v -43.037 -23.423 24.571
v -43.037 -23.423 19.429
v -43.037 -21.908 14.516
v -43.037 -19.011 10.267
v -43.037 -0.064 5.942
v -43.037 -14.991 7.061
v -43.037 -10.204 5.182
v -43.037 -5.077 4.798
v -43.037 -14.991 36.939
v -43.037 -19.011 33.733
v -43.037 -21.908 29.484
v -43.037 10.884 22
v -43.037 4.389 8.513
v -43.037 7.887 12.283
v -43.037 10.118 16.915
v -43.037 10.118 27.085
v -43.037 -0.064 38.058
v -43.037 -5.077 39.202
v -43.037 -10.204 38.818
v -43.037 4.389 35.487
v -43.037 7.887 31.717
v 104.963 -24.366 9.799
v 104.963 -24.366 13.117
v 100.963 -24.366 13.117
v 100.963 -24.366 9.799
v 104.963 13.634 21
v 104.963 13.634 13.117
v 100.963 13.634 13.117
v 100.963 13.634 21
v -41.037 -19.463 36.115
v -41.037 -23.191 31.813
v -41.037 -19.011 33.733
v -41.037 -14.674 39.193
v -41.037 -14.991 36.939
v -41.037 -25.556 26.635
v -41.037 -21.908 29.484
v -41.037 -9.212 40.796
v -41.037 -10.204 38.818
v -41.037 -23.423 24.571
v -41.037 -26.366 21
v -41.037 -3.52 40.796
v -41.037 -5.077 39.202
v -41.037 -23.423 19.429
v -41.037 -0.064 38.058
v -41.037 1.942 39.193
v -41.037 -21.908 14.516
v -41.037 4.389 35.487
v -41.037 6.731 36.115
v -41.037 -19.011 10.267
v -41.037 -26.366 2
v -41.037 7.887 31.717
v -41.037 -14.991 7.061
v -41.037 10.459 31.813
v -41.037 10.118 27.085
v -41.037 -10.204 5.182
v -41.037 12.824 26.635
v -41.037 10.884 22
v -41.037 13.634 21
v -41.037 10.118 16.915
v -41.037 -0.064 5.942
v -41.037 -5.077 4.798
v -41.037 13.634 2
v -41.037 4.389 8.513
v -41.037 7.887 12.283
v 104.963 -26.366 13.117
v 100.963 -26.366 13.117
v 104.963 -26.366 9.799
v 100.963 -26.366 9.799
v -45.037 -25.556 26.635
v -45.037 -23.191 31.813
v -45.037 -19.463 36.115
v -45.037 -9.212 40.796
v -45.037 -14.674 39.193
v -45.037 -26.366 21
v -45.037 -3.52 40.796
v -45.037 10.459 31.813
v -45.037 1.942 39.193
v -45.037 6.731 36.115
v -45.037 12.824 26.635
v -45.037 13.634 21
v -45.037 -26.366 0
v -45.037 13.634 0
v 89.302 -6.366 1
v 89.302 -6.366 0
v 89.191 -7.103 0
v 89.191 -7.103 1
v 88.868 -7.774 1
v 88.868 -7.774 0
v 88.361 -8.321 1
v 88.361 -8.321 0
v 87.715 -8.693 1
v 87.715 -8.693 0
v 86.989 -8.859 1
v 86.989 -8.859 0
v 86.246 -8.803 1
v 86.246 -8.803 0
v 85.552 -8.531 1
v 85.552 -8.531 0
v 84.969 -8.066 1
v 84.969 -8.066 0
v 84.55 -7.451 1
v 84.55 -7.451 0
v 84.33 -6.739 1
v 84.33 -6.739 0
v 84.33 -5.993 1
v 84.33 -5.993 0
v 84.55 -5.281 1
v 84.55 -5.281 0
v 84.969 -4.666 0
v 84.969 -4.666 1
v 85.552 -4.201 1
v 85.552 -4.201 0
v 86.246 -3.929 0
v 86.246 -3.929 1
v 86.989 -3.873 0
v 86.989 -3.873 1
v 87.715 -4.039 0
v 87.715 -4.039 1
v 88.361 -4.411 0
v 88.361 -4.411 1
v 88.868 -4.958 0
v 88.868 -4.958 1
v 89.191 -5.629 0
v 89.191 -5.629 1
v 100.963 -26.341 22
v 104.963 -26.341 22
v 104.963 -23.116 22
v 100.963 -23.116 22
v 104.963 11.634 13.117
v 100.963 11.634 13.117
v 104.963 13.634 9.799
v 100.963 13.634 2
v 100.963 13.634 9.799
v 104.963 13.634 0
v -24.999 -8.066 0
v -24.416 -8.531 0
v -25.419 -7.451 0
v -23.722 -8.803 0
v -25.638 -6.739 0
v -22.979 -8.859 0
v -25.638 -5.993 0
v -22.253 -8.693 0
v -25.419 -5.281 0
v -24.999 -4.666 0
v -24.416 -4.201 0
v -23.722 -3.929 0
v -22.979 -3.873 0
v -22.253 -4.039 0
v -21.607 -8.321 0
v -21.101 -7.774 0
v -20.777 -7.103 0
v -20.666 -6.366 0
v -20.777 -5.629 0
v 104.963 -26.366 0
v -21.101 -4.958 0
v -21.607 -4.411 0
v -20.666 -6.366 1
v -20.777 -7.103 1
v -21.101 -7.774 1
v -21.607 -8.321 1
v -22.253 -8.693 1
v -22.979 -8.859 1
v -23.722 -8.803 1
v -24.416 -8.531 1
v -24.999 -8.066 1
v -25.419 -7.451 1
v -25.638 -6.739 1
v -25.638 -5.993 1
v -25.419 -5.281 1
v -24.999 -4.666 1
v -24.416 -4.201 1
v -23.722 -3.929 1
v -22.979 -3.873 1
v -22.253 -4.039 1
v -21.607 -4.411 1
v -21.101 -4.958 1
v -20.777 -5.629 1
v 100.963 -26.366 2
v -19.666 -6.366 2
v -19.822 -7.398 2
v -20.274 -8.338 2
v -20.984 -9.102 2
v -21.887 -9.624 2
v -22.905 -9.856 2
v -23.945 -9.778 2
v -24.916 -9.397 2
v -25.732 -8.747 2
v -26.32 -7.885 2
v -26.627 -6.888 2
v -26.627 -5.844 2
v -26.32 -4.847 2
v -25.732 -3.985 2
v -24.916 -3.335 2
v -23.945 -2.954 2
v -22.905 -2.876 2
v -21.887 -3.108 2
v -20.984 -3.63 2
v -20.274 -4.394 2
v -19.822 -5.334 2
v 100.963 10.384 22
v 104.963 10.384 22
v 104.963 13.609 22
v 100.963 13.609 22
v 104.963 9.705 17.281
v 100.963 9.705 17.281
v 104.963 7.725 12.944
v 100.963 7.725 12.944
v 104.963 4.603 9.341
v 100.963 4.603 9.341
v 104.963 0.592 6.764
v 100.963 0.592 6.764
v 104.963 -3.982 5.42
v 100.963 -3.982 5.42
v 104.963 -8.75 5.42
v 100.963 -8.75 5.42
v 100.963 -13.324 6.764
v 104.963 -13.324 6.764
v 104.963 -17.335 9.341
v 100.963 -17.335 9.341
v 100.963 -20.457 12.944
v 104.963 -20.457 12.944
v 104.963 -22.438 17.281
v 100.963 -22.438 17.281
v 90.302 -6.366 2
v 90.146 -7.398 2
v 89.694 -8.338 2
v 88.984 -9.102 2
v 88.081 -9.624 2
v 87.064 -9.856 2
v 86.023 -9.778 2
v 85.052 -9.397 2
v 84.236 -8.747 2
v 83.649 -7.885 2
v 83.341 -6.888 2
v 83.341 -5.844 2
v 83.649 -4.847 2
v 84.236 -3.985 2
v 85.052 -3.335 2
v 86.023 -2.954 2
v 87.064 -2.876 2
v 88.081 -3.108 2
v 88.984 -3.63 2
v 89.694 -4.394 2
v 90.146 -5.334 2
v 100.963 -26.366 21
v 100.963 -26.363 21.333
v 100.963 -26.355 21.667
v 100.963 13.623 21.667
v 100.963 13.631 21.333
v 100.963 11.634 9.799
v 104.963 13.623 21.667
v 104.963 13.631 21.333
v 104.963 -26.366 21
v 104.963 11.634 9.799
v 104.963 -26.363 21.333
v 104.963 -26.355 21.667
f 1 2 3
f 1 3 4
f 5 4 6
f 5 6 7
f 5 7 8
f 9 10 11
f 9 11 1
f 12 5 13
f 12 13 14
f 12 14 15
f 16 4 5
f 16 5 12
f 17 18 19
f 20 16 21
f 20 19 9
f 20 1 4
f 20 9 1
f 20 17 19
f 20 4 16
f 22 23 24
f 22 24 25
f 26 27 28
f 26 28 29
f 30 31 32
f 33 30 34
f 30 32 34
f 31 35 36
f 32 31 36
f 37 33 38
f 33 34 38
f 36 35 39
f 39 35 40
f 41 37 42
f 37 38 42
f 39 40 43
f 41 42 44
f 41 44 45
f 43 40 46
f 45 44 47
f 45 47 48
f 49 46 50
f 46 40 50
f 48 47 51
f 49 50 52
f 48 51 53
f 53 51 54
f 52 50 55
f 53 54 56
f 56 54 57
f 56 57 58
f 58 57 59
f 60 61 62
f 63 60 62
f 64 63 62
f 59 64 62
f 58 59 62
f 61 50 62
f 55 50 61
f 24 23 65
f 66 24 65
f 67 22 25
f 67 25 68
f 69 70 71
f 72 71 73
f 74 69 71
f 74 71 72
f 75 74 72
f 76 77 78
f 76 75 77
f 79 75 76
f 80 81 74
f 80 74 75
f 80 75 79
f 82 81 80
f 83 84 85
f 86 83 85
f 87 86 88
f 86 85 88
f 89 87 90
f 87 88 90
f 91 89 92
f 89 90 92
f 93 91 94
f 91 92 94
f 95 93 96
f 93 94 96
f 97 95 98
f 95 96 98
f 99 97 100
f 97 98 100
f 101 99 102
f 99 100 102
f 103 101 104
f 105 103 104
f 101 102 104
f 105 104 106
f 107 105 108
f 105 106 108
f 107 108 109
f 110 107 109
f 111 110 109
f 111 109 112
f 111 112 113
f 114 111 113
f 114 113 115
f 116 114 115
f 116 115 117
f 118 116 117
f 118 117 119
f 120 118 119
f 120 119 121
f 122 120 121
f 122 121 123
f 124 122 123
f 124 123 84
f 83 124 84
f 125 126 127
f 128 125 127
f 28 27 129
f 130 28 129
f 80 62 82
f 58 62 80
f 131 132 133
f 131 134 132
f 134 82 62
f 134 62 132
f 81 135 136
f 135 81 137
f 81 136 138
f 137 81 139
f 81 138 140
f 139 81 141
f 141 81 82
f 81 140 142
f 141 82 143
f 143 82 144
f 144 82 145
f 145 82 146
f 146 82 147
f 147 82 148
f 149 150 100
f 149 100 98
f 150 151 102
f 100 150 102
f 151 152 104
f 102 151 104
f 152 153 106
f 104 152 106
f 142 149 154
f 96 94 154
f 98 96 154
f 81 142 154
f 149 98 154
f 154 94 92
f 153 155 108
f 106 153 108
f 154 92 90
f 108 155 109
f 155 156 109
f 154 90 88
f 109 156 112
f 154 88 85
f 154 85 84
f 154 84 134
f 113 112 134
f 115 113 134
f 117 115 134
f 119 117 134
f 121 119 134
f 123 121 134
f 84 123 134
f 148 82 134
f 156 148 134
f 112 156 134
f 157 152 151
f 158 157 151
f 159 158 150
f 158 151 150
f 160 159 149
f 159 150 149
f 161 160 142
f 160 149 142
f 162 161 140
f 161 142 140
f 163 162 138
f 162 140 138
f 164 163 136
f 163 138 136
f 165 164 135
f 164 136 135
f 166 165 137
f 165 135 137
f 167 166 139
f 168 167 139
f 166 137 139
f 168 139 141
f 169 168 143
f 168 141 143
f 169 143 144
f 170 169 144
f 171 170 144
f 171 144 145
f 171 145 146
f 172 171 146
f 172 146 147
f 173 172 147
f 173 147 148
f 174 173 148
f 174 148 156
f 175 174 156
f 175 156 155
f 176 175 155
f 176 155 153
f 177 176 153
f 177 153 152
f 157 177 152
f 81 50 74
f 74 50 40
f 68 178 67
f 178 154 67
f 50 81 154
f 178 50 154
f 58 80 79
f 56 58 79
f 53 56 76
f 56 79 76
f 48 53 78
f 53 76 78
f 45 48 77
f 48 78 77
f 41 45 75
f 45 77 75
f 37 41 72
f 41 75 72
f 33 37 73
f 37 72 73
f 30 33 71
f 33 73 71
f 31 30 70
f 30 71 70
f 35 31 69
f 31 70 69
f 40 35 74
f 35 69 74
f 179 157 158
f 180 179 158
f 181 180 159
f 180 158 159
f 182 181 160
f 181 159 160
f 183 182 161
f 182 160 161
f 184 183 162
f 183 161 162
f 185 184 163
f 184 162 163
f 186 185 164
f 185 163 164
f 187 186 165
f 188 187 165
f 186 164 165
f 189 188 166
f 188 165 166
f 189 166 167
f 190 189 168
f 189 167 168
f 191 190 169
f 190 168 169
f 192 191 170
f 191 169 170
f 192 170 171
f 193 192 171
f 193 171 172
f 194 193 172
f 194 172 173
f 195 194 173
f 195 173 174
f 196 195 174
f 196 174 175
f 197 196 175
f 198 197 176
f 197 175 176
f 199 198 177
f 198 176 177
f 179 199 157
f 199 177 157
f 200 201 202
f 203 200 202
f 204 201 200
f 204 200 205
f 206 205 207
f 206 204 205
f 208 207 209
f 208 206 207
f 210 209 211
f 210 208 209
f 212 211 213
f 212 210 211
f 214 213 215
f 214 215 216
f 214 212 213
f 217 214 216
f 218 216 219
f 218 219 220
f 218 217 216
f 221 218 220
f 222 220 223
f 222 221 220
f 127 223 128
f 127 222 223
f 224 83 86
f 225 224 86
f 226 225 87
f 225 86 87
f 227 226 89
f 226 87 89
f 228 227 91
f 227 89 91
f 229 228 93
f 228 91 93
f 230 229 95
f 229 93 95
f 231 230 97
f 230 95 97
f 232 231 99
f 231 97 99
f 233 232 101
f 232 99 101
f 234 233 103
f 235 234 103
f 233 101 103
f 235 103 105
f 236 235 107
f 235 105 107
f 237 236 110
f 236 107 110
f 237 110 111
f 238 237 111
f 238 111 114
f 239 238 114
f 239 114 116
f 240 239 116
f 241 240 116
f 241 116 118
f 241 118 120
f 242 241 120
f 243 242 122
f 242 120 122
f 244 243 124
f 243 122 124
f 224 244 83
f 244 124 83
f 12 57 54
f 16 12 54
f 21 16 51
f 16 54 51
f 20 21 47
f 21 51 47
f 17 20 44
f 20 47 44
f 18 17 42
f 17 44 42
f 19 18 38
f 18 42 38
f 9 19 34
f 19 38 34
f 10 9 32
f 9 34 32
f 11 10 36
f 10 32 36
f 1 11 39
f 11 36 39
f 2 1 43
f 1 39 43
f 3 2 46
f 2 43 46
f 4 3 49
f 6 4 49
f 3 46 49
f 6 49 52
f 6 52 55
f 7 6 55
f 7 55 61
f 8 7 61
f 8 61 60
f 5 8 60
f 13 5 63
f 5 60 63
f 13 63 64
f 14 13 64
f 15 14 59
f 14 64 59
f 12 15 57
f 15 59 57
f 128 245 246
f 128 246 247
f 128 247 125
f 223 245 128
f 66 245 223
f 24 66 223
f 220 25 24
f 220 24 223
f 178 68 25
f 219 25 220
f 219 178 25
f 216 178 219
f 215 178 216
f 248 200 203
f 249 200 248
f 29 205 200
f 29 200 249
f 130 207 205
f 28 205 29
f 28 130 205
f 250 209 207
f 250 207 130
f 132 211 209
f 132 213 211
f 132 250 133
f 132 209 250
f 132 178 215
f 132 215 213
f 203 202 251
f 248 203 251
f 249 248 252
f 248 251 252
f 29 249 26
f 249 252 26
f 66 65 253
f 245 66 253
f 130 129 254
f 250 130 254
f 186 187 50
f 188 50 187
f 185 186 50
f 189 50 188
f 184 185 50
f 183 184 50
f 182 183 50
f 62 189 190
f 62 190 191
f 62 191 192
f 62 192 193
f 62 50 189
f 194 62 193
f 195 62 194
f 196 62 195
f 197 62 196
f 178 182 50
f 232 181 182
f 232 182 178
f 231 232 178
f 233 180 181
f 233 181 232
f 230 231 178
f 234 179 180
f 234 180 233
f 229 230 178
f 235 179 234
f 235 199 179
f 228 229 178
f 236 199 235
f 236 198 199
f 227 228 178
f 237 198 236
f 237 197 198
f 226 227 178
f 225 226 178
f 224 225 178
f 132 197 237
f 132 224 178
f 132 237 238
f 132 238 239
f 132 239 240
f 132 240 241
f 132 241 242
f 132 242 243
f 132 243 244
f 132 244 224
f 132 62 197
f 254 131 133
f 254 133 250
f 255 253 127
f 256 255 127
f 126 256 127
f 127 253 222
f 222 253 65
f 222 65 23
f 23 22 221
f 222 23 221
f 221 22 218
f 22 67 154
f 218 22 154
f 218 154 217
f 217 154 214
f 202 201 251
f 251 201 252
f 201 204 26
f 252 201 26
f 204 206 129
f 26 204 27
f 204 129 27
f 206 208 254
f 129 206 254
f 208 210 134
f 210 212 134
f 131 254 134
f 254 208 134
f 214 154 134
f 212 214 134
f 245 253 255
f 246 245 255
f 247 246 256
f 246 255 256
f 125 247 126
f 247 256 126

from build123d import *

# Parameters (mm, degrees)
F0_W      = 150
F0_H      = 40
F1_DEPTH  = 2
F2_W      = 4
F2_H      = 40
F2_W_2    = 2
F3_DEPTH  = 40
F4_R      = 17.25
F5_DEPTH  = 2
F7_DEPTH  = 20
F8_DEPTH  = 2.001
F9_R      = 2.5
F10_DEPTH = 42.001
F11_W     = 2
F11_H     = 3.3180480823
F12_DEPTH = 25
F14_DEPTH = 150.001
F15_SIZE  = 1
F16_DEPTH = 2


with BuildPart() as f1:
    # F0 (on Top) → F1 (new body)
    with BuildSketch(Plane.XY):
        with Locations((29.9631836727, -6.3660135493)):
            Rectangle(F0_W, F0_H)
    extrude(amount=F1_DEPTH)

    # F2 (on face) → F3 (join)
    with BuildSketch(Plane.XY.offset(2)):
        with Locations((-43.0368163273, -6.3660135493)):
            Rectangle(F2_W, F2_H)
        with Locations((103.9631836727, -6.3660135493)):
            Rectangle(F2_W_2, F2_H)
    extrude(amount=F3_DEPTH)

    # F4 (on face) → F5 (cut)
    with BuildSketch(Plane.YZ.offset(-41.0368163273)):
        with Locations((-6.3660135493, 22)):
            Circle(F4_R)
    extrude(amount=-F5_DEPTH, mode=Mode.SUBTRACT)

    # F7 (cut): a face of the model
    f7_faces = [f1.faces().sort_by_distance(p)[0] for p in [
        (103.9631836727, -6.3660135493, 42),
    ]]
    extrude(f7_faces, amount=-F7_DEPTH, mode=Mode.SUBTRACT)

    # F6 (on face) → F8 (cut, through all)
    with BuildSketch(Plane(origin=(102.9631836727, 0, 0), x_dir=(0, -1, 0), z_dir=(-1, 0, 0))):
        with BuildLine():
            Line((23.1160135493, 22), (-10.3839864507, 22))
            ThreePointArc((-10.3839864507, 22), (6.3660135493, 5.25), (23.1160135493, 22))
        make_face()
    extrude(amount=-F8_DEPTH, mode=Mode.SUBTRACT)

    # F9 (on face) → F10 (cut, through all)
    with BuildSketch(Plane(origin=(0, 0, 0), x_dir=(1, 0, 0), z_dir=(0, 0, -1))):
        with Locations((-23.1661424041, 6.3660135493)):
            Circle(F9_R)
        with Locations((86.8019685149, 6.3660135493)):
            Circle(F9_R)
    extrude(amount=-F10_DEPTH, mode=Mode.SUBTRACT)

    # F11 (on face) → F12 (cut)
    with BuildSketch(Plane.YZ.offset(104.9631836727)):
        with Locations((-25.3660135493, 11.4577081986)):
            Rectangle(F11_W, F11_H)
        with Locations((12.6339864507, 11.4577081986)):
            Rectangle(F11_W, F11_H)
    extrude(amount=-F12_DEPTH, mode=Mode.SUBTRACT)

    # F13 (on face) → F14 (cut, through all)
    with BuildSketch(Plane(origin=(-45.0368163273, 0, 0), x_dir=(0, -1, 0), z_dir=(-1, 0, 0))):
        with BuildLine():
            ThreePointArc((-13.6339864507, 21), (6.3660135493, 41), (26.3660135493, 21))
            Line((26.3660135493, 21), (26.3660135493, 42))
            Line((26.3660135493, 42), (-13.6339864507, 42))
            Line((-13.6339864507, 42), (-13.6339864507, 21))
        make_face()
    extrude(amount=-F14_DEPTH, mode=Mode.SUBTRACT)

    # F15
    f15_edges = [f1.edges().sort_by_distance(p)[0] for p in [
        (-25.666142, -6.366014, 2),
        (84.301969, -6.366014, 2),
    ]]
    chamfer(f15_edges, length=F15_SIZE)

    # F16 (add): a face of the model
    f16_faces = [f1.faces().sort_by_distance(p)[0] for p in [
        (102.9631836727, -6.3660135493, 2.4472135955),
    ]]
    extrude(f16_faces, amount=F16_DEPTH)


solid = f1.part
